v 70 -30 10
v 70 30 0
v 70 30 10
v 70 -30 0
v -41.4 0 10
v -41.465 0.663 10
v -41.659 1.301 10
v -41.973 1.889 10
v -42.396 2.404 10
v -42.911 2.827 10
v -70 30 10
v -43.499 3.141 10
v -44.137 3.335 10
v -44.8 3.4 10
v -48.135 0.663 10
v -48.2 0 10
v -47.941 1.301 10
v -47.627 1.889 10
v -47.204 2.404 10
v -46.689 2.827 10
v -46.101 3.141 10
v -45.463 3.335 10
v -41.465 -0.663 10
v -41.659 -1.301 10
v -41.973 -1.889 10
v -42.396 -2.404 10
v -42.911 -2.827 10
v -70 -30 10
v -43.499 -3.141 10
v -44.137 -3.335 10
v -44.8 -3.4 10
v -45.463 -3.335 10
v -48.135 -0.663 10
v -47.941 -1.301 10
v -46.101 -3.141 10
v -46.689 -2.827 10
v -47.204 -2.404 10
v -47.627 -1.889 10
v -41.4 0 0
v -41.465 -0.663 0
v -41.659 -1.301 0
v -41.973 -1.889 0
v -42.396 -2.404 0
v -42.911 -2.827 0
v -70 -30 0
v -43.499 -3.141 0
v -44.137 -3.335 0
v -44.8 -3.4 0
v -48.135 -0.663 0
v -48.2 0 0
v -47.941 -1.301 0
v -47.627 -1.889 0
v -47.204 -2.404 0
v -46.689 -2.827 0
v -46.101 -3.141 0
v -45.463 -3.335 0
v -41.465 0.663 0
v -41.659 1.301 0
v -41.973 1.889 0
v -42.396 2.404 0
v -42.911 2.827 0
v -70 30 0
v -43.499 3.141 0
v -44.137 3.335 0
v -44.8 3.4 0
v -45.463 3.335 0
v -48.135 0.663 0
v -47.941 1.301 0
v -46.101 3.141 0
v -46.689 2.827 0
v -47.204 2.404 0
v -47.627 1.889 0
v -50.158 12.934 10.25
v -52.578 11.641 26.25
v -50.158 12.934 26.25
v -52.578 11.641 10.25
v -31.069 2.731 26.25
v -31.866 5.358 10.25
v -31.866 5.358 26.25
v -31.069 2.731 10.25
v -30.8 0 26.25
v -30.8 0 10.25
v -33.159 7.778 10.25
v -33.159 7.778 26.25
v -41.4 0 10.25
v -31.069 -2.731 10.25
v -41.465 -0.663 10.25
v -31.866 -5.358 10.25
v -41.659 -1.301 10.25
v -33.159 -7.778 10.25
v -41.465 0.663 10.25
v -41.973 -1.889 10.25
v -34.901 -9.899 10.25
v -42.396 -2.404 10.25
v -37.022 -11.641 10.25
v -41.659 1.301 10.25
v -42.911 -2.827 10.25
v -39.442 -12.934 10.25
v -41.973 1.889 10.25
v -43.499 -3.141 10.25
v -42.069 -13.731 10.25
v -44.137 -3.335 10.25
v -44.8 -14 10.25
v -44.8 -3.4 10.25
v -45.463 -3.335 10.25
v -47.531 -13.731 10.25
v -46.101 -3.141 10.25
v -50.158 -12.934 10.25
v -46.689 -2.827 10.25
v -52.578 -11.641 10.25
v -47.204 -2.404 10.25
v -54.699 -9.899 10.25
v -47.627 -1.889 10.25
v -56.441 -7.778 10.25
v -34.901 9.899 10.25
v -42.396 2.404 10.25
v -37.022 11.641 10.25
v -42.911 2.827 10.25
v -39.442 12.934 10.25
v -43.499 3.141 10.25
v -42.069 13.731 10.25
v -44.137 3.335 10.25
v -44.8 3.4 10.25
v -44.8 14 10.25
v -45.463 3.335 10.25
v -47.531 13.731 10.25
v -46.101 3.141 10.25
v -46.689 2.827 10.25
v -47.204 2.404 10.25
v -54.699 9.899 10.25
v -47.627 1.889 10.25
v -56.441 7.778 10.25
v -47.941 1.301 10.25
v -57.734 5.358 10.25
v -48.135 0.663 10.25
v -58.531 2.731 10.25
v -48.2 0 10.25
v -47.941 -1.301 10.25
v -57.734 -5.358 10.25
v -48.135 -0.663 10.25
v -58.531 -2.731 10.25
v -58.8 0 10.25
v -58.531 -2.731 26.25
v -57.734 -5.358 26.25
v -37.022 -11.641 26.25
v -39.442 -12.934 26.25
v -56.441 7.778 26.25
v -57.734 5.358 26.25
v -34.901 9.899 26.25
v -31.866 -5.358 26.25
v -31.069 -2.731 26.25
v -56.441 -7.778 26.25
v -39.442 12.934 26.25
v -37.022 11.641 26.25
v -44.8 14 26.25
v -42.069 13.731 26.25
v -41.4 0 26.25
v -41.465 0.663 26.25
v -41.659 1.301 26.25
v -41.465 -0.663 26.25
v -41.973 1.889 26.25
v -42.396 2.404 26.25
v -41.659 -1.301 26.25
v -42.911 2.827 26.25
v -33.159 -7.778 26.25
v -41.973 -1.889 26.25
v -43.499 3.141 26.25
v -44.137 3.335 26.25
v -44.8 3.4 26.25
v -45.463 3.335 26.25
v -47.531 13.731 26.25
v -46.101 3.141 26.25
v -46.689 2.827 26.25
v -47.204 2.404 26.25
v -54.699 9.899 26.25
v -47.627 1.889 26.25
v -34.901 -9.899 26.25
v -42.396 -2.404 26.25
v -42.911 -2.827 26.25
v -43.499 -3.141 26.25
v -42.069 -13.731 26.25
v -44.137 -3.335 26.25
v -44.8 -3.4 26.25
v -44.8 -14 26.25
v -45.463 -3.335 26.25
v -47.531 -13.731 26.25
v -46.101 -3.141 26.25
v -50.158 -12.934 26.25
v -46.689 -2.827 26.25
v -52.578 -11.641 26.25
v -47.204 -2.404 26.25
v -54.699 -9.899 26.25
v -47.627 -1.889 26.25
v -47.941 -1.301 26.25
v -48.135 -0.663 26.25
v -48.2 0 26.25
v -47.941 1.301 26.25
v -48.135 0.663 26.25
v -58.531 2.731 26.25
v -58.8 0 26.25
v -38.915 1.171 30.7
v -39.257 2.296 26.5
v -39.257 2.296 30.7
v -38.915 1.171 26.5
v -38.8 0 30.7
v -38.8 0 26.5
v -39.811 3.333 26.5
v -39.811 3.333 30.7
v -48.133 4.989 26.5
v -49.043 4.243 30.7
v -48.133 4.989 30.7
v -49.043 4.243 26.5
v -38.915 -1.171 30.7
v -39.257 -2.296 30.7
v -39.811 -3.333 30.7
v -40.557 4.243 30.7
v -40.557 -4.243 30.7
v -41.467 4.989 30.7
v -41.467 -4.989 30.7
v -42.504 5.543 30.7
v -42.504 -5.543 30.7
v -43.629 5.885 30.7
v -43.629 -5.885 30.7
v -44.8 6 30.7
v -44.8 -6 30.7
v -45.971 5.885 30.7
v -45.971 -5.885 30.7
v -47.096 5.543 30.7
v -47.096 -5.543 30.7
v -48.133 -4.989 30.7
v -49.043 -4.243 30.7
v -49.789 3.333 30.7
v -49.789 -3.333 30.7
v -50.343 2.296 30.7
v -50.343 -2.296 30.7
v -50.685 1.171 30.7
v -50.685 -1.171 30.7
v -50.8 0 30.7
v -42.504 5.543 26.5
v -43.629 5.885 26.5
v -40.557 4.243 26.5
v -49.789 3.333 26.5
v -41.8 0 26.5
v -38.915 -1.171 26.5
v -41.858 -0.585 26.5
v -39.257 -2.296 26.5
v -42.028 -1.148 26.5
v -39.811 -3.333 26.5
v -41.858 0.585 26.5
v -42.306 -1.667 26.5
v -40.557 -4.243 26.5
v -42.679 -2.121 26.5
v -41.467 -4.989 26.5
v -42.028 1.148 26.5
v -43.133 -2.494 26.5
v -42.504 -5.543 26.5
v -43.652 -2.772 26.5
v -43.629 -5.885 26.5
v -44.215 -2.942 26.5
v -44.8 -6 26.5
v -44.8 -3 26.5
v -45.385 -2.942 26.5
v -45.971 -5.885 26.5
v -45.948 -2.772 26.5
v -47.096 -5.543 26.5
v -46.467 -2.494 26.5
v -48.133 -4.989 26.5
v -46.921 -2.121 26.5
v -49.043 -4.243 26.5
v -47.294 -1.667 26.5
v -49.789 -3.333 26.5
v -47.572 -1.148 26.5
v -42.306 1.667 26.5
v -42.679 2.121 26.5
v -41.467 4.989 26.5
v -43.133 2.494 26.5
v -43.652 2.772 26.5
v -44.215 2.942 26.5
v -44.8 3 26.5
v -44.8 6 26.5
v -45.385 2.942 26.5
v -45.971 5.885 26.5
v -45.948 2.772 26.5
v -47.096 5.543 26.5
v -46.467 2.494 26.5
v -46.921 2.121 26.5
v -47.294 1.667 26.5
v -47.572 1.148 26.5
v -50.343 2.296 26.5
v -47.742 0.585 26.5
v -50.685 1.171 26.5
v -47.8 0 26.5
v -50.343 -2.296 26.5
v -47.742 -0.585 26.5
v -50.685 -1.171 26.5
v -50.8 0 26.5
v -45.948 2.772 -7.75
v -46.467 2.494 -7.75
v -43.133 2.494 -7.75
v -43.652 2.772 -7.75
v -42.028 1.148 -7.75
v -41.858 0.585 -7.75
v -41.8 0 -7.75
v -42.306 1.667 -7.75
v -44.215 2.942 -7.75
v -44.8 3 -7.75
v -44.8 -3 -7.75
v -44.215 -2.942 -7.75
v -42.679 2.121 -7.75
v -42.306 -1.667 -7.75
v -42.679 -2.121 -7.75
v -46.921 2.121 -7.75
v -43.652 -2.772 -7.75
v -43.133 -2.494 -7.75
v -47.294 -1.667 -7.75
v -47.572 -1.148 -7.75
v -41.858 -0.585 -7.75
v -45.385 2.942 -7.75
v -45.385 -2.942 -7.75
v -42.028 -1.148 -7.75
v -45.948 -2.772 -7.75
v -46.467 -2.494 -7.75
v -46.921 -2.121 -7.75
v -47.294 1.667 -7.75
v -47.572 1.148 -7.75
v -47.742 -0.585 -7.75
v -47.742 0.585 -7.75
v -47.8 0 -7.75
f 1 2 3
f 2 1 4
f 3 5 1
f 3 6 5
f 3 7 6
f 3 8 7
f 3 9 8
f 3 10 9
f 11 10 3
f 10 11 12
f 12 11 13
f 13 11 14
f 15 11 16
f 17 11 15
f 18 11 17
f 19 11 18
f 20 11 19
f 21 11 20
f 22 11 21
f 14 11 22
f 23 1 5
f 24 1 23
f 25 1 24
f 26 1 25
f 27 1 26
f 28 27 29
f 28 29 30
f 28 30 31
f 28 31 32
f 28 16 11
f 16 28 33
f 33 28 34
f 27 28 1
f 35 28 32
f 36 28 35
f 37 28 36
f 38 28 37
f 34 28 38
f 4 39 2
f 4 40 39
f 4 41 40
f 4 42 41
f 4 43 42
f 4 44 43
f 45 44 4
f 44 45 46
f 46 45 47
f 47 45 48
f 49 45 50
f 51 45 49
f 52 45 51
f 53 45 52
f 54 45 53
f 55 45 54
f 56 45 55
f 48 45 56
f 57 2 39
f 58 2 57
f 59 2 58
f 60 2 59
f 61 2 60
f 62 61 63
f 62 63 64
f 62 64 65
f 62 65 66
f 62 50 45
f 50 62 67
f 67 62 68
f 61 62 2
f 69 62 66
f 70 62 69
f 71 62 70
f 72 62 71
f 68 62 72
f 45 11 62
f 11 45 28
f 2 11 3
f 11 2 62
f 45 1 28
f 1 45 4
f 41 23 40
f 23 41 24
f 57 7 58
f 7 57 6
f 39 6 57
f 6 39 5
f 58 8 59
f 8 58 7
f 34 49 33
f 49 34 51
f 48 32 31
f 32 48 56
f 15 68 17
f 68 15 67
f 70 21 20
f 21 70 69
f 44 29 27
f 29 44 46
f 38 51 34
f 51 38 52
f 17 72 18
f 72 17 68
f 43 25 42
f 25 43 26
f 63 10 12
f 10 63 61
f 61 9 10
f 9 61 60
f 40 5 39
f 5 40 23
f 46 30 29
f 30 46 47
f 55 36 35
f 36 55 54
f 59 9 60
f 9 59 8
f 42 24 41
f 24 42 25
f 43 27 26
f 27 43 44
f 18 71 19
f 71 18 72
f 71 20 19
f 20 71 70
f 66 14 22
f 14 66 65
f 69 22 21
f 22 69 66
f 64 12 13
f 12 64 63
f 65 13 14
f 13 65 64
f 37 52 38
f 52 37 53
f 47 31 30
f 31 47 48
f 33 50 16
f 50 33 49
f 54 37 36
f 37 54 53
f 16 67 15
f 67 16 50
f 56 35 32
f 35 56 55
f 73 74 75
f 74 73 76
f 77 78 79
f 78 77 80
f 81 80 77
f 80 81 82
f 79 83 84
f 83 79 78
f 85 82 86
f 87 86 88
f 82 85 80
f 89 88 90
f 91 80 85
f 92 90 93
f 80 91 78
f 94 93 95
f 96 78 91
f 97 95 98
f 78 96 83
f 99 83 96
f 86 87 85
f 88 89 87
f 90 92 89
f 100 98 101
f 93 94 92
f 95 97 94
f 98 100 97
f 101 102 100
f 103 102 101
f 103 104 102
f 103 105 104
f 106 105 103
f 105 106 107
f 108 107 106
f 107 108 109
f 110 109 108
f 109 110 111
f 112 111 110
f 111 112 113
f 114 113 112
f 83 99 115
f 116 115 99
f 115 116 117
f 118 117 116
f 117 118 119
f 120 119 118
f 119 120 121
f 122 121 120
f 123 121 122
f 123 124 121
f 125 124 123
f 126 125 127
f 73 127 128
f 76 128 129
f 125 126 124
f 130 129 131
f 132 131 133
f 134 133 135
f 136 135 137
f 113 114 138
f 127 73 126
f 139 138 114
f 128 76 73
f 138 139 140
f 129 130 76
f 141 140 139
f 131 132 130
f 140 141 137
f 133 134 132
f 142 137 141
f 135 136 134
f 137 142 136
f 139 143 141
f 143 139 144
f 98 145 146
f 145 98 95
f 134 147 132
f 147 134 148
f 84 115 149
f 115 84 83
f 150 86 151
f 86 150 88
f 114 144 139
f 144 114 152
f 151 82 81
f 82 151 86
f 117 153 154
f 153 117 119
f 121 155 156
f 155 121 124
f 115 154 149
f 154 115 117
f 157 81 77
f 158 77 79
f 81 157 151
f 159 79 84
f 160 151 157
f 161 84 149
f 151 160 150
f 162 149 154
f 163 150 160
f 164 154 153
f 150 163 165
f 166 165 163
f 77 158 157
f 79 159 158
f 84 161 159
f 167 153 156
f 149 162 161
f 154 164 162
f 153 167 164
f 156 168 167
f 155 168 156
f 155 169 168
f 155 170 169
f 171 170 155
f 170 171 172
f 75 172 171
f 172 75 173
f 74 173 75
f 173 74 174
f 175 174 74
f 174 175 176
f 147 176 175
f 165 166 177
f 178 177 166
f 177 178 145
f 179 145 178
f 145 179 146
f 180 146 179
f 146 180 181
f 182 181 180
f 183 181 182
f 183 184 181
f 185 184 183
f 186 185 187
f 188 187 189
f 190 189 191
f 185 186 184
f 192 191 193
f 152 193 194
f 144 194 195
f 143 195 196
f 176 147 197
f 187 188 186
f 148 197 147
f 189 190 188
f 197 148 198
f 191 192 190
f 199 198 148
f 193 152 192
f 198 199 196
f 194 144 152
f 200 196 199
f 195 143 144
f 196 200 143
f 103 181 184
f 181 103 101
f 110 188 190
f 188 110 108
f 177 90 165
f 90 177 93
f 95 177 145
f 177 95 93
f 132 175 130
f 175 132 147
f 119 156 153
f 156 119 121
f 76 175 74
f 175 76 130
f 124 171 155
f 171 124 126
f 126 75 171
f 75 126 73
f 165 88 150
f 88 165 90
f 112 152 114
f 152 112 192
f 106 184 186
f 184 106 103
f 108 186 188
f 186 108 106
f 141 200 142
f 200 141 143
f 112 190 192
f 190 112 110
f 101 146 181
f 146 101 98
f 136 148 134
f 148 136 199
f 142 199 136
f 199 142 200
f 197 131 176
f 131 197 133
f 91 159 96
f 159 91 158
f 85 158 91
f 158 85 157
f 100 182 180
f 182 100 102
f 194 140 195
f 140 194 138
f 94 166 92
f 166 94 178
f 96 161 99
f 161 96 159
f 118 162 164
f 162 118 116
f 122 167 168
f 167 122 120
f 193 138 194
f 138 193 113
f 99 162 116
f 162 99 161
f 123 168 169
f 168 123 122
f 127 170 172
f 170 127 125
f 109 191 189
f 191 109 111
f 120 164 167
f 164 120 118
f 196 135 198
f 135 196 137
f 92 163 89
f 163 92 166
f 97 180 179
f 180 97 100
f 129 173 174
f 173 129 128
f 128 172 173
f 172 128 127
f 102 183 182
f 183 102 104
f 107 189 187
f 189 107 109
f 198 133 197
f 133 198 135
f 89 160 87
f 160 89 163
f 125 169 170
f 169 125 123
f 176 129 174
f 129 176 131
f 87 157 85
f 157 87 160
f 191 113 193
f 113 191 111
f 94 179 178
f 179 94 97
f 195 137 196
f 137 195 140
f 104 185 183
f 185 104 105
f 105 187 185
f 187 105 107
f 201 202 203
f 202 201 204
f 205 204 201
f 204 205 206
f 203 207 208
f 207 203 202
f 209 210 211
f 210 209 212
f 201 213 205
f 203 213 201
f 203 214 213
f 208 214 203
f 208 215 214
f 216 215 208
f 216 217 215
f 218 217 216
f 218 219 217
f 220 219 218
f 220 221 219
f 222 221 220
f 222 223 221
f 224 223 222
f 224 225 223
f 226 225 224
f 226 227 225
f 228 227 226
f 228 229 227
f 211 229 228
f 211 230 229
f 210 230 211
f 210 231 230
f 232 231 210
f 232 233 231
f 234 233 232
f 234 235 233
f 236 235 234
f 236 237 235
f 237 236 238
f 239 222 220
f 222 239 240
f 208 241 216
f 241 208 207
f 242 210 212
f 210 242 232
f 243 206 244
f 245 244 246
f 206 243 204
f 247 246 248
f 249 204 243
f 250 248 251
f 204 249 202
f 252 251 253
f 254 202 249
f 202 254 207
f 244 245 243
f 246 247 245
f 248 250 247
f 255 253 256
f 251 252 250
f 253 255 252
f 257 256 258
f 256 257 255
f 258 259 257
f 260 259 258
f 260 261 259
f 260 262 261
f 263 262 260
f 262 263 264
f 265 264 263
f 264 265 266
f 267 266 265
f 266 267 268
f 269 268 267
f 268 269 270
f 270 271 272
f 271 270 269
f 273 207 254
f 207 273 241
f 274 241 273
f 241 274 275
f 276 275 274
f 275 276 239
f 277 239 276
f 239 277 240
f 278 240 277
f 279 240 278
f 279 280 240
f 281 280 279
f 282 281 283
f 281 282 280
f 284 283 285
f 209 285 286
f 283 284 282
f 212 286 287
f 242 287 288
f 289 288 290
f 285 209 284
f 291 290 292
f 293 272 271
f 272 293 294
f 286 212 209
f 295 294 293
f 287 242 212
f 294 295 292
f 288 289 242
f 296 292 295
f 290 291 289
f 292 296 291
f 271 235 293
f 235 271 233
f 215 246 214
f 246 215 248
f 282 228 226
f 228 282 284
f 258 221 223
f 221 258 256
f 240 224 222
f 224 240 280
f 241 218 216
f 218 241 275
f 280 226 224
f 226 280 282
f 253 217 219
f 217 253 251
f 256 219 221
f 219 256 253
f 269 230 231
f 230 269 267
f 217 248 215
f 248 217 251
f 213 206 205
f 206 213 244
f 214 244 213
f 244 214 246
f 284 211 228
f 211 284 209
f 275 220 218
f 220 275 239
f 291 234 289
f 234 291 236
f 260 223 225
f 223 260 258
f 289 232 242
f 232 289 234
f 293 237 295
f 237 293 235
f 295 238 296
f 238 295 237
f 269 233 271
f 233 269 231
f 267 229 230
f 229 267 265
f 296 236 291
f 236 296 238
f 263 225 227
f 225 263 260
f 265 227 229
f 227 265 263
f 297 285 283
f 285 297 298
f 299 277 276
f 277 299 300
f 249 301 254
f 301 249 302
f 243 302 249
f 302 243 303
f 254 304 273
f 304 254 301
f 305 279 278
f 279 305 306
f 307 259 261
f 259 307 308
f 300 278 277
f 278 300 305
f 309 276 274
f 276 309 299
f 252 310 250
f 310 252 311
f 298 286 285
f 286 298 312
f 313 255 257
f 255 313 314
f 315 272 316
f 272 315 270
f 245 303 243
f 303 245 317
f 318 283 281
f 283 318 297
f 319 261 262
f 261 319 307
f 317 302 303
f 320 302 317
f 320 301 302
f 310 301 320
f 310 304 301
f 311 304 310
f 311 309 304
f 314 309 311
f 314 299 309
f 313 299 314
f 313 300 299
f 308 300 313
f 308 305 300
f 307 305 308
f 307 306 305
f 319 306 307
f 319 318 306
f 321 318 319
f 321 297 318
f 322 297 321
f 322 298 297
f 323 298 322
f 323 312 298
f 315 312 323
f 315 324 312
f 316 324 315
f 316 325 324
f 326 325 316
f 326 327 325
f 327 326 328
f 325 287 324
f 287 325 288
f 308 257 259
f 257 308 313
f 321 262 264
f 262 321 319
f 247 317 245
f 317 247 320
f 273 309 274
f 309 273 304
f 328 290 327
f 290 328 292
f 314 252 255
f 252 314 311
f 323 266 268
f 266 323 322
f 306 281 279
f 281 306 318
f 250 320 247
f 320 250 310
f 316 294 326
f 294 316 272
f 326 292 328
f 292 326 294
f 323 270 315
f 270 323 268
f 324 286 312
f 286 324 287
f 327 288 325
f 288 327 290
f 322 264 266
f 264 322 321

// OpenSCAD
$fn = 32;

// ------------------------------------------------------------------------
// Standoff columns: 1 d28 standoffs, bolts d6
// Every part is its own module, assembly() places them once.
// ------------------------------------------------------------------------

// --- part 1 ---
module base_plate() {
  difference() {
    translate([-70, -30, 0]) cube([140, 60, 10]);
    translate([-44.8, 0, -1]) cylinder(h = 12, d = 6.8);
  }
}

// --- part 2 ---
module spacer() {
  difference() {
      translate([0, 0, 0]) cylinder(h = 16, d = 28);
      translate([0, 0, -1]) cylinder(h = 18, d = 6.8);
    }
}

// --- part 3 ---
module bolt() {
  cylinder(h = 4.2, d = 12);
  translate([0, 0, -34.25]) cylinder(h = 34.25, d = 6);
}

// --- assembly ---
module assembly() {
  translate([0, 0, 0]) rotate([0, 0, 0]) base_plate();
  translate([-44.8, 0, 10.25]) rotate([0, 0, 0]) spacer();
  translate([-44.8, 0, 26.5]) rotate([0, 0, 0]) bolt();
}

assembly();
